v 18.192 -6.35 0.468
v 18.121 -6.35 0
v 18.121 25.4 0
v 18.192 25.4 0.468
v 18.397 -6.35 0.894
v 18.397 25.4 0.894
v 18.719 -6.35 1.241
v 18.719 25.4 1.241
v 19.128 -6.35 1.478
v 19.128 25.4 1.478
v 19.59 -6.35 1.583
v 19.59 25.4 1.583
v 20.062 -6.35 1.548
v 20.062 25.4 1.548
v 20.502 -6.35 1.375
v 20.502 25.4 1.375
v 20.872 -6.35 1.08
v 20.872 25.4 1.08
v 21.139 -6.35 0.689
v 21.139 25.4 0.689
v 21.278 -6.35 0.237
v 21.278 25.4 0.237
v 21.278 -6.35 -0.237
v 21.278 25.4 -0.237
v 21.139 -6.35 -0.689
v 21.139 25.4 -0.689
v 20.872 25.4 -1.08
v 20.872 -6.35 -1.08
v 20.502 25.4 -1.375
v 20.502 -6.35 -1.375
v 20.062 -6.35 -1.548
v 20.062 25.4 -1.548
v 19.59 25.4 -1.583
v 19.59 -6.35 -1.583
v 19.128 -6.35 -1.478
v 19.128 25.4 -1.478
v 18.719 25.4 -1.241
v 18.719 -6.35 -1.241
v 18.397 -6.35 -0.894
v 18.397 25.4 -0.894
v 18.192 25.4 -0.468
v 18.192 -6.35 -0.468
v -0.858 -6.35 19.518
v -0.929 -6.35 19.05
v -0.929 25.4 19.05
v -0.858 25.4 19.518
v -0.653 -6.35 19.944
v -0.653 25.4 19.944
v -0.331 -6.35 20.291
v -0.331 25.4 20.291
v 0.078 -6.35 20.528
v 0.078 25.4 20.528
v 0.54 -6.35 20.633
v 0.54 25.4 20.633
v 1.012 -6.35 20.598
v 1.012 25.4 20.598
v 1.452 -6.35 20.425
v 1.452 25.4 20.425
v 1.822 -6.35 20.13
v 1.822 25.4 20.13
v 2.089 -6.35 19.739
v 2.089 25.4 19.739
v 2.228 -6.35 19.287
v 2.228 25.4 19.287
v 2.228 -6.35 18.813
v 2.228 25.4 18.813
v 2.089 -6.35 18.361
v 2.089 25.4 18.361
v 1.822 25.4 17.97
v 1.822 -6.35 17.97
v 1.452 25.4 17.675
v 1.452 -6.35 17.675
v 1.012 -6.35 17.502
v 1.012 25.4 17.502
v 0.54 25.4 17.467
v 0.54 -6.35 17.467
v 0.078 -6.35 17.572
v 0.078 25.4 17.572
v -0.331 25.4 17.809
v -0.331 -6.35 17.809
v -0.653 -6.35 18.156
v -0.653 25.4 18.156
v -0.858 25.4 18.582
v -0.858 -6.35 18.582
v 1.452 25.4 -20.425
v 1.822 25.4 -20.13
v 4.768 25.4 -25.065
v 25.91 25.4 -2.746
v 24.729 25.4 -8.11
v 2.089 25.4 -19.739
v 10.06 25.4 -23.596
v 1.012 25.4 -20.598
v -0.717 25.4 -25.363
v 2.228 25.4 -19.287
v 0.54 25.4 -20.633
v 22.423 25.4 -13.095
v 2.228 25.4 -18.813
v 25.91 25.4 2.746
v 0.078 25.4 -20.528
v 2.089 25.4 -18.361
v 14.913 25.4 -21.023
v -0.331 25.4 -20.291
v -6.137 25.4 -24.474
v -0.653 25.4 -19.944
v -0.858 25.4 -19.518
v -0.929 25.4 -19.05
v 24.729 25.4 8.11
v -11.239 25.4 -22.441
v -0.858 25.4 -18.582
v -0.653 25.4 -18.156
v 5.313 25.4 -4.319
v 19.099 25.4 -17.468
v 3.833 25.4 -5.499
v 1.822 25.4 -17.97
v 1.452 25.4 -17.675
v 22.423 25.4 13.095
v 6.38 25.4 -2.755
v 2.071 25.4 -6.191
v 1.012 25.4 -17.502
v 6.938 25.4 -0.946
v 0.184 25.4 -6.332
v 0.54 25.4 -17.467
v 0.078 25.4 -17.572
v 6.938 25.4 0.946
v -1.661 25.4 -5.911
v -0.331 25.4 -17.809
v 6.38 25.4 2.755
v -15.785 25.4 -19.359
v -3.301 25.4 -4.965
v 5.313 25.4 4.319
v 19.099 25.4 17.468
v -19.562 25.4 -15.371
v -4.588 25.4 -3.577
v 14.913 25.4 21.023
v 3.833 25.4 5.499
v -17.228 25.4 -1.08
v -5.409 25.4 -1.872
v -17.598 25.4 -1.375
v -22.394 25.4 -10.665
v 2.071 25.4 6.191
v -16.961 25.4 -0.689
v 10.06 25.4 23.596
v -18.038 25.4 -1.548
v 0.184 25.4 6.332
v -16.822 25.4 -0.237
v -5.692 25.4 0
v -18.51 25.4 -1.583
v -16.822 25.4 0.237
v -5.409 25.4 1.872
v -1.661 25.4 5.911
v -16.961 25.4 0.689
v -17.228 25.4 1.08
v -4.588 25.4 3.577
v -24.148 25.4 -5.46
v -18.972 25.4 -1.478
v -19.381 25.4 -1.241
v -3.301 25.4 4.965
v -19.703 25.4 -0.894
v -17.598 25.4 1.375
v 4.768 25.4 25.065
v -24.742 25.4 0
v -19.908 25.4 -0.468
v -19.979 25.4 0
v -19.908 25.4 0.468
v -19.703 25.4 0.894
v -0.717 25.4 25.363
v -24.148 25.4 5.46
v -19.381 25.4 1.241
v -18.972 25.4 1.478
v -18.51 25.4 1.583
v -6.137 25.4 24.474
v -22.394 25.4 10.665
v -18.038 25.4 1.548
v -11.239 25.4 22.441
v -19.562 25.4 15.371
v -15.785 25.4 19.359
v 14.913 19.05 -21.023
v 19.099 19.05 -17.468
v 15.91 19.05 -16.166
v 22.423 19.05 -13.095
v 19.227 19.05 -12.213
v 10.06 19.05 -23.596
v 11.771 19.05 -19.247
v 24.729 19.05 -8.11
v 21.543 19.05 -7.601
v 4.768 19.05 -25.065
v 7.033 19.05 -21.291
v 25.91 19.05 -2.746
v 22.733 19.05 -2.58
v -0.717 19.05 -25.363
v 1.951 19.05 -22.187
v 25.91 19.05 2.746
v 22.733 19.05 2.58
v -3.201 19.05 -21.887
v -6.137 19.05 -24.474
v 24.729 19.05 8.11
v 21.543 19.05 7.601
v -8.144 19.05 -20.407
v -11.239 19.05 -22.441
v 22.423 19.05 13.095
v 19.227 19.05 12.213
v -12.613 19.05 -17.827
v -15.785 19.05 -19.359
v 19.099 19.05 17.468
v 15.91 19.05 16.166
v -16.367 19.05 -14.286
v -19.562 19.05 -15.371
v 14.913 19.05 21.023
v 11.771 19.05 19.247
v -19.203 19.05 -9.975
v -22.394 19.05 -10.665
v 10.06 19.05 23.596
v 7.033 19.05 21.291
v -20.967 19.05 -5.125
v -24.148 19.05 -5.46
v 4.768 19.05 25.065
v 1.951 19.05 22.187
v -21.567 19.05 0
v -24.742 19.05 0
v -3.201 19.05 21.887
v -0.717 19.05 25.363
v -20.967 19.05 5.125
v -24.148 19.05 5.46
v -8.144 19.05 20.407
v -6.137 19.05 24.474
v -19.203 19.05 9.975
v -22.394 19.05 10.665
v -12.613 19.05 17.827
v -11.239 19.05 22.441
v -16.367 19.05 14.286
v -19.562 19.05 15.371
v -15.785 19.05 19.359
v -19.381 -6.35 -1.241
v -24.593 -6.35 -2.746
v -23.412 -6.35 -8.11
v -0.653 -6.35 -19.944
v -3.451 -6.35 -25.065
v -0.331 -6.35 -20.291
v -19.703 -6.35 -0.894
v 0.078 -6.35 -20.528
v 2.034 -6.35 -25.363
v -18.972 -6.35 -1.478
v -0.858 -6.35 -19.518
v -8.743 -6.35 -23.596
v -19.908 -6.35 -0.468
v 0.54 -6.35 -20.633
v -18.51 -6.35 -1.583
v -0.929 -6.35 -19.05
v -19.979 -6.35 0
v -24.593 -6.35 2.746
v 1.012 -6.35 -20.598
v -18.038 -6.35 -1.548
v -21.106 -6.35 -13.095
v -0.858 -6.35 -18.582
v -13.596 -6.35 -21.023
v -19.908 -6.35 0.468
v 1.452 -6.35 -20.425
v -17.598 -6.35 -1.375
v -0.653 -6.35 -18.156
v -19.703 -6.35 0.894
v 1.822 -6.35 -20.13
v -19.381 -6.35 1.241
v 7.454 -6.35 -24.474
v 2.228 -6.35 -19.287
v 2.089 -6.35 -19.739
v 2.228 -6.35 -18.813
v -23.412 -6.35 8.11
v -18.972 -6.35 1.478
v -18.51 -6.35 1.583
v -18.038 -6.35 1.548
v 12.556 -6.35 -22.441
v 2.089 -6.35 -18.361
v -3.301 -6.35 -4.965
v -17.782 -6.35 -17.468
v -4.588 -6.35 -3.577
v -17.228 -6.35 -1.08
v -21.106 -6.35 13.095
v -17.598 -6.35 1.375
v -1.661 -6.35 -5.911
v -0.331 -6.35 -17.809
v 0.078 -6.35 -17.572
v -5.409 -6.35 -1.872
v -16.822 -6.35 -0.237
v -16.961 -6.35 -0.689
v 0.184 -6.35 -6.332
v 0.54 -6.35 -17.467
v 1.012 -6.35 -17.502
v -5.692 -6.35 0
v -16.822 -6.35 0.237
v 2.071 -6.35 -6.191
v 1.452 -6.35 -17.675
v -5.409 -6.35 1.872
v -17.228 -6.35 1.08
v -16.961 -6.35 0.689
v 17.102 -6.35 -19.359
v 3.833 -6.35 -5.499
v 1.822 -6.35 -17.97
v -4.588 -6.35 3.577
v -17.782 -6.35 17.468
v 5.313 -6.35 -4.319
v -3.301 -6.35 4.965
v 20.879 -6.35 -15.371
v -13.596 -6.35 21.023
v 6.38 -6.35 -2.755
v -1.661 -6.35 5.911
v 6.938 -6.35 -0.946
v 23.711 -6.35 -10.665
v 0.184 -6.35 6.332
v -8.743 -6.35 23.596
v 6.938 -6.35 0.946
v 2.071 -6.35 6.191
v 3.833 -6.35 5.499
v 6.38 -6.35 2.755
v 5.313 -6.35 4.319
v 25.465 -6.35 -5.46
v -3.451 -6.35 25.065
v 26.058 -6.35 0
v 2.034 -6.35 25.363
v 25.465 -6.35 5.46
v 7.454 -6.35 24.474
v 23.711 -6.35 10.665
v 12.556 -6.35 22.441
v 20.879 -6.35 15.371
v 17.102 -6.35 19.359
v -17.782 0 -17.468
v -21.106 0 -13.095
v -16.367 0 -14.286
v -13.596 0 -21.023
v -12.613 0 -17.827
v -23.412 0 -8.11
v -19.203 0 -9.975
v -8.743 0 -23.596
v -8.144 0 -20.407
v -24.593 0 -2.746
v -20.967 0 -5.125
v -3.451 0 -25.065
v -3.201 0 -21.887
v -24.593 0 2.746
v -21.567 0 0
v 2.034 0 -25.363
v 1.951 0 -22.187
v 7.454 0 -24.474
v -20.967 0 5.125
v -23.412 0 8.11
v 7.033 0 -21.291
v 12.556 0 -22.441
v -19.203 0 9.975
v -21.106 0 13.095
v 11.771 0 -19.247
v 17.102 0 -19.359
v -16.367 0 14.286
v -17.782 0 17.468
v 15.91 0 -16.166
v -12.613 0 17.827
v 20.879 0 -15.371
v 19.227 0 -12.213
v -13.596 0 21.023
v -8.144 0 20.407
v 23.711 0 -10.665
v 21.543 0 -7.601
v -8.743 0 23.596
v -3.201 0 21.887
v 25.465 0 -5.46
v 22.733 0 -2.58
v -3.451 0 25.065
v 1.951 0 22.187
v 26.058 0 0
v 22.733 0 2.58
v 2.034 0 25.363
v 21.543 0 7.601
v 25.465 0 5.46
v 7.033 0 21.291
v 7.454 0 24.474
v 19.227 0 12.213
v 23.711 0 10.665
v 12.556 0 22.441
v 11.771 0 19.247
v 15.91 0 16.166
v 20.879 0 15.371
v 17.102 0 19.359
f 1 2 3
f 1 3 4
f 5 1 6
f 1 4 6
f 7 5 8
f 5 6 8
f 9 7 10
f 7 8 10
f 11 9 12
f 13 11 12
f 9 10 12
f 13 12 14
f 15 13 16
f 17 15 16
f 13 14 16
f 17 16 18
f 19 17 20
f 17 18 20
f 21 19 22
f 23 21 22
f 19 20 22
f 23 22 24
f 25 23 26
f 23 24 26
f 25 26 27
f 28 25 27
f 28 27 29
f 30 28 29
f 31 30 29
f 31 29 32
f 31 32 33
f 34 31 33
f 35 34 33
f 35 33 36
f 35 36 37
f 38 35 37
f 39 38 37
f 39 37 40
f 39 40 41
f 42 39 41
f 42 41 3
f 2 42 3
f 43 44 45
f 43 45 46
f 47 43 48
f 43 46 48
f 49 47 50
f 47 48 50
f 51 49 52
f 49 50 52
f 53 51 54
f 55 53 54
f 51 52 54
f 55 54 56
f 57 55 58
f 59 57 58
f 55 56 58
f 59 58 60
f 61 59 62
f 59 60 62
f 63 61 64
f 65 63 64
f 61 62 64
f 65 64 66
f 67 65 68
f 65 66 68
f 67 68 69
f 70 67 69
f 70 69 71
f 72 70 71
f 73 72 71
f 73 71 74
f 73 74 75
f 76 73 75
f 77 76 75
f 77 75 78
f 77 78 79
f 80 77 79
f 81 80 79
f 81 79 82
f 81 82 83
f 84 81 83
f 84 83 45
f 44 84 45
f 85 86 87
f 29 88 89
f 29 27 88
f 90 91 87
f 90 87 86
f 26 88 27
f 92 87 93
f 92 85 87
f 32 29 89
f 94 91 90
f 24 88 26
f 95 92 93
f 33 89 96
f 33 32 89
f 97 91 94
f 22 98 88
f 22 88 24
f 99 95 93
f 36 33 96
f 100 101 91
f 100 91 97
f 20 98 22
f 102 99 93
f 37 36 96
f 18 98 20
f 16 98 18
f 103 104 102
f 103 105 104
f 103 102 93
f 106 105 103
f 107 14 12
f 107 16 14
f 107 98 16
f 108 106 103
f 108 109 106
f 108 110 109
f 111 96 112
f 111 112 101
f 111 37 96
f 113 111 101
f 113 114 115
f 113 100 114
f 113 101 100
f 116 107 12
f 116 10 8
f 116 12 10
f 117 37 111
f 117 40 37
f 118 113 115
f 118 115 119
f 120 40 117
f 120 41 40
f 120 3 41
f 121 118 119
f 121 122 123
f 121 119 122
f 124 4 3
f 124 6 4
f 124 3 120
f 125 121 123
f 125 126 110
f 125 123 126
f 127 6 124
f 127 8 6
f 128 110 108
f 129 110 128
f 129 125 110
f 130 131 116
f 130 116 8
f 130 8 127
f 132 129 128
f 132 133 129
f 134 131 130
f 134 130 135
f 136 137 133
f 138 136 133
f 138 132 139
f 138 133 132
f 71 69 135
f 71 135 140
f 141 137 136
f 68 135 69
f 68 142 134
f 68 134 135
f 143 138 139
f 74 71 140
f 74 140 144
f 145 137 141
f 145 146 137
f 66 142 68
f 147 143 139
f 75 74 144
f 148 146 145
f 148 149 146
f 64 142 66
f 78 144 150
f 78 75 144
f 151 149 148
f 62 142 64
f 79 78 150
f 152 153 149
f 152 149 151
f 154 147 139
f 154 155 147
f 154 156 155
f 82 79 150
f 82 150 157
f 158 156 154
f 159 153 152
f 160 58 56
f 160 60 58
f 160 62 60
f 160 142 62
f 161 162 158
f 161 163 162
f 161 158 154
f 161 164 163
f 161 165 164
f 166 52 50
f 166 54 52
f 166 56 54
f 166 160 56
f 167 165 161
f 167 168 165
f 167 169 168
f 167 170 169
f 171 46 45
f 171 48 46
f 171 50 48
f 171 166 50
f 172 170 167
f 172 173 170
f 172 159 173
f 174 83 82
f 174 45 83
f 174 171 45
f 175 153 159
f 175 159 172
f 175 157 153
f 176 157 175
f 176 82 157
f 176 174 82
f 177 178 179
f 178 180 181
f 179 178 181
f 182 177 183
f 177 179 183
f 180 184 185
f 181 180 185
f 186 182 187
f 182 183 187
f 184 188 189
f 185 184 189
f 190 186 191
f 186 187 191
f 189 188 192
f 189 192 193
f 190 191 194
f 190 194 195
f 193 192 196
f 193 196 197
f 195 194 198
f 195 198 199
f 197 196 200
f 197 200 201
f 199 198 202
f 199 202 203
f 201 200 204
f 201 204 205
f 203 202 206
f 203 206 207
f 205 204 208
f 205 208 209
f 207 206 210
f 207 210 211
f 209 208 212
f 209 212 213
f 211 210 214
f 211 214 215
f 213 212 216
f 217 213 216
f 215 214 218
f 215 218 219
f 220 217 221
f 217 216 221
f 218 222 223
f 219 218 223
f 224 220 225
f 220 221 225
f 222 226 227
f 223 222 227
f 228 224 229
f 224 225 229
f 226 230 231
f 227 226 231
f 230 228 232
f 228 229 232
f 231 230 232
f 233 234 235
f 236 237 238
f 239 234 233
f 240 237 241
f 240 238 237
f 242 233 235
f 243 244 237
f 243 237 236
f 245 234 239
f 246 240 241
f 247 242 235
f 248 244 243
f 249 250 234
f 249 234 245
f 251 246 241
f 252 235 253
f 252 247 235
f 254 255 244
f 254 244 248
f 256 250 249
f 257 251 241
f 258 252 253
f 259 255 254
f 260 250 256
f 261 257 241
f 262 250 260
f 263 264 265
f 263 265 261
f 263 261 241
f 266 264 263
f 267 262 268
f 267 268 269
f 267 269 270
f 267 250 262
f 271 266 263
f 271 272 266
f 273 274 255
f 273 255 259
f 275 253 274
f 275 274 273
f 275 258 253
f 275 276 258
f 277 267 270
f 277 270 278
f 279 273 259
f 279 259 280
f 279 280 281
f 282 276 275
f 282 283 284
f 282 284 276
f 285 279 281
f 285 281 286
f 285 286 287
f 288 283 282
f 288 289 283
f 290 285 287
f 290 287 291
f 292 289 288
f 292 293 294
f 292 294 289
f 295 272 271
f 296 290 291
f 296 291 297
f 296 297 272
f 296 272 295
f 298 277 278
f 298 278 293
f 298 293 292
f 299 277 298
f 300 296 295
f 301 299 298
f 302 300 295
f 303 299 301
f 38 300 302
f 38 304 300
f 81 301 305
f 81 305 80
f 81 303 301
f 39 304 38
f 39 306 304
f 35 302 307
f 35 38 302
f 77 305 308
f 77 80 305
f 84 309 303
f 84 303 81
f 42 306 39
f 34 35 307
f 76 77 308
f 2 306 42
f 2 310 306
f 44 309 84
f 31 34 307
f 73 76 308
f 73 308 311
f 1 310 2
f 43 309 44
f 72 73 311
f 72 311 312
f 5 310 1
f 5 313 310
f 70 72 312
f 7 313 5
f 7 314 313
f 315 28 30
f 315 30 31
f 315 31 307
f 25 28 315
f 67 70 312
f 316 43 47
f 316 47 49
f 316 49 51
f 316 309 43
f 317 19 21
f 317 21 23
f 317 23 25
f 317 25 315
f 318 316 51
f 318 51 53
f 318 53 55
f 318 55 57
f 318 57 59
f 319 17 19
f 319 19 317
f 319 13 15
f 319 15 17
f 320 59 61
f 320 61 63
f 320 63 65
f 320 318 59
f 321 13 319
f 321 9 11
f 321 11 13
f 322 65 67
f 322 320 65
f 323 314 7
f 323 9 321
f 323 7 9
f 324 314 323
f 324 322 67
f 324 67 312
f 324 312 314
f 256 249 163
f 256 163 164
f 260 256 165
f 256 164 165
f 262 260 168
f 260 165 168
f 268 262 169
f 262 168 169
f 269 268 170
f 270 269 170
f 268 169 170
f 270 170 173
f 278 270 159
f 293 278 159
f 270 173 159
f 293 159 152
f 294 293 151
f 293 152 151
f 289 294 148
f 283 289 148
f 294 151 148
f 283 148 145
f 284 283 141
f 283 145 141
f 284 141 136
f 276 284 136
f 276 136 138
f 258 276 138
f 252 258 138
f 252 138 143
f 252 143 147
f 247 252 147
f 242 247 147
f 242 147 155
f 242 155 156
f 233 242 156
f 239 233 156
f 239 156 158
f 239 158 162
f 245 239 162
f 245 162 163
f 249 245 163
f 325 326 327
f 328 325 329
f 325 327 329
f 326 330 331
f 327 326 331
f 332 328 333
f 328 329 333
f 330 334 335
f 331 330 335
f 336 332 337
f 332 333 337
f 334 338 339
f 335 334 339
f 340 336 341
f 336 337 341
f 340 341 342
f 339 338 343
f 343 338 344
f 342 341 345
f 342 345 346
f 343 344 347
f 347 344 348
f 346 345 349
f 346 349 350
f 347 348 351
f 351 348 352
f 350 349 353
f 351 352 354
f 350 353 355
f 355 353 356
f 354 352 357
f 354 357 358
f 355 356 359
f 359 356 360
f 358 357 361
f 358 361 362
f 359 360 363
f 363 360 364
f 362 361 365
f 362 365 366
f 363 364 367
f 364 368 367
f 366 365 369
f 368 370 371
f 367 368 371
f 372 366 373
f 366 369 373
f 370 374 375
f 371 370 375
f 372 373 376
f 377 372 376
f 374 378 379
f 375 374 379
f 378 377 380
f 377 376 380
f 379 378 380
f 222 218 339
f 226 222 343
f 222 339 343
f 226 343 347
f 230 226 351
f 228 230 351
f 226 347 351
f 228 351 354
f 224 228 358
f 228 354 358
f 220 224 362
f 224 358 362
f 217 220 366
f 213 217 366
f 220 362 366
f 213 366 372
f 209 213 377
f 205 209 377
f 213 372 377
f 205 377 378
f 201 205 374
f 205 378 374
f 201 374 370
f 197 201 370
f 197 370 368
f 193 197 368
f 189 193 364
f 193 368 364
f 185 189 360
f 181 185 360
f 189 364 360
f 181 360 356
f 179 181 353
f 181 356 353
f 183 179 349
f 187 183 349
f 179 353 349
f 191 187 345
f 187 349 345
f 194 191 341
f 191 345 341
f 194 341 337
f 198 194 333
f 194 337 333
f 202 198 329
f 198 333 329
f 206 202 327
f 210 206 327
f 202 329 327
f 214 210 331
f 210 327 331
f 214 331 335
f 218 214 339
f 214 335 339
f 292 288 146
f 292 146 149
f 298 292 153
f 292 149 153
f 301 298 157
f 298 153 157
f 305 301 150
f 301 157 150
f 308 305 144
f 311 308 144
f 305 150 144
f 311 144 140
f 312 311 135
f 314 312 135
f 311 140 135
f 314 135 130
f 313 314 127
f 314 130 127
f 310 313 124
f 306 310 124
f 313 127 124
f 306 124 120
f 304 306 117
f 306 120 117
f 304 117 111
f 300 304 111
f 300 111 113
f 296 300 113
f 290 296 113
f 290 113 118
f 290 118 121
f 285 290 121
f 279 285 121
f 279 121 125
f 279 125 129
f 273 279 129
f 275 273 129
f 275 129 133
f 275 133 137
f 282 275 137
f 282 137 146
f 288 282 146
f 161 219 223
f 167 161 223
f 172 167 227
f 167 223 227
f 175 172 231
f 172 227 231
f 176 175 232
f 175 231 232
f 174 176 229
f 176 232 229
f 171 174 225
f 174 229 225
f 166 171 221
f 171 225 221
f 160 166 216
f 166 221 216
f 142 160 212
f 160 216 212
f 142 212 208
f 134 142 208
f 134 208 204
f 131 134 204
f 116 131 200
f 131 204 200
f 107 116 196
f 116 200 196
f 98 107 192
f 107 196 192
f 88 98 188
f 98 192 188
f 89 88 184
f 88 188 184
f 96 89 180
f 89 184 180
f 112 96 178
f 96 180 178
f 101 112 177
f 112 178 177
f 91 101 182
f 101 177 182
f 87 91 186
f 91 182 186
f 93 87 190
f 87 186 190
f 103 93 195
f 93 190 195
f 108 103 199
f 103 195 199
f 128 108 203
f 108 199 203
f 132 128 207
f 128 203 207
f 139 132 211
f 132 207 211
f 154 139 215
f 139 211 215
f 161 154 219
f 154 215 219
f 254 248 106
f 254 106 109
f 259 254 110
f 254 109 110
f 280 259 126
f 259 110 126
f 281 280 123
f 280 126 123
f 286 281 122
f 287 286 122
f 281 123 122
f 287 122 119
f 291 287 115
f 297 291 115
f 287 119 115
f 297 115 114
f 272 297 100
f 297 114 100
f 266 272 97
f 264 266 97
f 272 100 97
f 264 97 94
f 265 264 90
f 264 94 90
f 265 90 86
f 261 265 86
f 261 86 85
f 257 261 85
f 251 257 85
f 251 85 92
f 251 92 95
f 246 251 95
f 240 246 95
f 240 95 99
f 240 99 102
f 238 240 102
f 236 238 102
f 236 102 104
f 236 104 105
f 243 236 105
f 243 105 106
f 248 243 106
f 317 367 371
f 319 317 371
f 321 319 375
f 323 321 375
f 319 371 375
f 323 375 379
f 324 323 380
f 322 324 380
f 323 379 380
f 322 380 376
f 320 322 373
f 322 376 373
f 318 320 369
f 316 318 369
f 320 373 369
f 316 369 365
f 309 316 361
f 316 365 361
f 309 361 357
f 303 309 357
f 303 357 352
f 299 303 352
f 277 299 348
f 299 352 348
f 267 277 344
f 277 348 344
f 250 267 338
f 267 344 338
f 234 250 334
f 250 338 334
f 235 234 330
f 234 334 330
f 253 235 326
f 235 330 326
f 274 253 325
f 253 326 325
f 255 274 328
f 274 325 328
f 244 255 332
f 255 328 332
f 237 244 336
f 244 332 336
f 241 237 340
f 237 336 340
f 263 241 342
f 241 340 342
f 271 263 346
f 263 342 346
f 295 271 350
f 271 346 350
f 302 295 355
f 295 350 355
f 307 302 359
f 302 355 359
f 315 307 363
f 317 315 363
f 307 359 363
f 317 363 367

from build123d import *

# Parameters (mm, degrees)
F0_R     = 25.4
F1_DEPTH = 6.35
F3_R     = 22.225
F4_DEPTH = 19.05
F5_R     = 25.4
F6_DEPTH = 6.35
F8_D     = 3.175
F9_D     = 12.7


with BuildPart() as f1:
    # F0 (on Front) → F1 (new body)
    with BuildSketch(Plane.XZ):
        with Locations((0.658478, 0)):
            Circle(F0_R)
    extrude(amount=F1_DEPTH)

    # F3 (on face) → F4 (join)
    with BuildSketch(Plane(origin=(0, 0, 0), x_dir=(-1, 0, 0), z_dir=(0, 1, 0))):
        with Locations((-0.658478, 0)):
            Circle(F3_R)
    extrude(amount=F4_DEPTH)

    # F5 (on face) → F6 (join)
    with BuildSketch(Plane(origin=(0, 19.05, 0), x_dir=(-1, 0, 0), z_dir=(0, 1, 0))):
        with Locations((-0.658478, 0)):
            Circle(F5_R)
    extrude(amount=F6_DEPTH)

    # F8 (through all)
    with Locations(Plane.XZ.offset(6.35)):
        with Locations((0.658478, 19.05), (19.708478, 0), (0.658478, -19.05), (-18.391522, 0)):
            Hole(F8_D / 2)

    # F9 (through all)
    with Locations(Plane.XZ.offset(6.35)):
        with Locations((0.658478, 0)):
            Hole(F9_D / 2)


solid = f1.part
